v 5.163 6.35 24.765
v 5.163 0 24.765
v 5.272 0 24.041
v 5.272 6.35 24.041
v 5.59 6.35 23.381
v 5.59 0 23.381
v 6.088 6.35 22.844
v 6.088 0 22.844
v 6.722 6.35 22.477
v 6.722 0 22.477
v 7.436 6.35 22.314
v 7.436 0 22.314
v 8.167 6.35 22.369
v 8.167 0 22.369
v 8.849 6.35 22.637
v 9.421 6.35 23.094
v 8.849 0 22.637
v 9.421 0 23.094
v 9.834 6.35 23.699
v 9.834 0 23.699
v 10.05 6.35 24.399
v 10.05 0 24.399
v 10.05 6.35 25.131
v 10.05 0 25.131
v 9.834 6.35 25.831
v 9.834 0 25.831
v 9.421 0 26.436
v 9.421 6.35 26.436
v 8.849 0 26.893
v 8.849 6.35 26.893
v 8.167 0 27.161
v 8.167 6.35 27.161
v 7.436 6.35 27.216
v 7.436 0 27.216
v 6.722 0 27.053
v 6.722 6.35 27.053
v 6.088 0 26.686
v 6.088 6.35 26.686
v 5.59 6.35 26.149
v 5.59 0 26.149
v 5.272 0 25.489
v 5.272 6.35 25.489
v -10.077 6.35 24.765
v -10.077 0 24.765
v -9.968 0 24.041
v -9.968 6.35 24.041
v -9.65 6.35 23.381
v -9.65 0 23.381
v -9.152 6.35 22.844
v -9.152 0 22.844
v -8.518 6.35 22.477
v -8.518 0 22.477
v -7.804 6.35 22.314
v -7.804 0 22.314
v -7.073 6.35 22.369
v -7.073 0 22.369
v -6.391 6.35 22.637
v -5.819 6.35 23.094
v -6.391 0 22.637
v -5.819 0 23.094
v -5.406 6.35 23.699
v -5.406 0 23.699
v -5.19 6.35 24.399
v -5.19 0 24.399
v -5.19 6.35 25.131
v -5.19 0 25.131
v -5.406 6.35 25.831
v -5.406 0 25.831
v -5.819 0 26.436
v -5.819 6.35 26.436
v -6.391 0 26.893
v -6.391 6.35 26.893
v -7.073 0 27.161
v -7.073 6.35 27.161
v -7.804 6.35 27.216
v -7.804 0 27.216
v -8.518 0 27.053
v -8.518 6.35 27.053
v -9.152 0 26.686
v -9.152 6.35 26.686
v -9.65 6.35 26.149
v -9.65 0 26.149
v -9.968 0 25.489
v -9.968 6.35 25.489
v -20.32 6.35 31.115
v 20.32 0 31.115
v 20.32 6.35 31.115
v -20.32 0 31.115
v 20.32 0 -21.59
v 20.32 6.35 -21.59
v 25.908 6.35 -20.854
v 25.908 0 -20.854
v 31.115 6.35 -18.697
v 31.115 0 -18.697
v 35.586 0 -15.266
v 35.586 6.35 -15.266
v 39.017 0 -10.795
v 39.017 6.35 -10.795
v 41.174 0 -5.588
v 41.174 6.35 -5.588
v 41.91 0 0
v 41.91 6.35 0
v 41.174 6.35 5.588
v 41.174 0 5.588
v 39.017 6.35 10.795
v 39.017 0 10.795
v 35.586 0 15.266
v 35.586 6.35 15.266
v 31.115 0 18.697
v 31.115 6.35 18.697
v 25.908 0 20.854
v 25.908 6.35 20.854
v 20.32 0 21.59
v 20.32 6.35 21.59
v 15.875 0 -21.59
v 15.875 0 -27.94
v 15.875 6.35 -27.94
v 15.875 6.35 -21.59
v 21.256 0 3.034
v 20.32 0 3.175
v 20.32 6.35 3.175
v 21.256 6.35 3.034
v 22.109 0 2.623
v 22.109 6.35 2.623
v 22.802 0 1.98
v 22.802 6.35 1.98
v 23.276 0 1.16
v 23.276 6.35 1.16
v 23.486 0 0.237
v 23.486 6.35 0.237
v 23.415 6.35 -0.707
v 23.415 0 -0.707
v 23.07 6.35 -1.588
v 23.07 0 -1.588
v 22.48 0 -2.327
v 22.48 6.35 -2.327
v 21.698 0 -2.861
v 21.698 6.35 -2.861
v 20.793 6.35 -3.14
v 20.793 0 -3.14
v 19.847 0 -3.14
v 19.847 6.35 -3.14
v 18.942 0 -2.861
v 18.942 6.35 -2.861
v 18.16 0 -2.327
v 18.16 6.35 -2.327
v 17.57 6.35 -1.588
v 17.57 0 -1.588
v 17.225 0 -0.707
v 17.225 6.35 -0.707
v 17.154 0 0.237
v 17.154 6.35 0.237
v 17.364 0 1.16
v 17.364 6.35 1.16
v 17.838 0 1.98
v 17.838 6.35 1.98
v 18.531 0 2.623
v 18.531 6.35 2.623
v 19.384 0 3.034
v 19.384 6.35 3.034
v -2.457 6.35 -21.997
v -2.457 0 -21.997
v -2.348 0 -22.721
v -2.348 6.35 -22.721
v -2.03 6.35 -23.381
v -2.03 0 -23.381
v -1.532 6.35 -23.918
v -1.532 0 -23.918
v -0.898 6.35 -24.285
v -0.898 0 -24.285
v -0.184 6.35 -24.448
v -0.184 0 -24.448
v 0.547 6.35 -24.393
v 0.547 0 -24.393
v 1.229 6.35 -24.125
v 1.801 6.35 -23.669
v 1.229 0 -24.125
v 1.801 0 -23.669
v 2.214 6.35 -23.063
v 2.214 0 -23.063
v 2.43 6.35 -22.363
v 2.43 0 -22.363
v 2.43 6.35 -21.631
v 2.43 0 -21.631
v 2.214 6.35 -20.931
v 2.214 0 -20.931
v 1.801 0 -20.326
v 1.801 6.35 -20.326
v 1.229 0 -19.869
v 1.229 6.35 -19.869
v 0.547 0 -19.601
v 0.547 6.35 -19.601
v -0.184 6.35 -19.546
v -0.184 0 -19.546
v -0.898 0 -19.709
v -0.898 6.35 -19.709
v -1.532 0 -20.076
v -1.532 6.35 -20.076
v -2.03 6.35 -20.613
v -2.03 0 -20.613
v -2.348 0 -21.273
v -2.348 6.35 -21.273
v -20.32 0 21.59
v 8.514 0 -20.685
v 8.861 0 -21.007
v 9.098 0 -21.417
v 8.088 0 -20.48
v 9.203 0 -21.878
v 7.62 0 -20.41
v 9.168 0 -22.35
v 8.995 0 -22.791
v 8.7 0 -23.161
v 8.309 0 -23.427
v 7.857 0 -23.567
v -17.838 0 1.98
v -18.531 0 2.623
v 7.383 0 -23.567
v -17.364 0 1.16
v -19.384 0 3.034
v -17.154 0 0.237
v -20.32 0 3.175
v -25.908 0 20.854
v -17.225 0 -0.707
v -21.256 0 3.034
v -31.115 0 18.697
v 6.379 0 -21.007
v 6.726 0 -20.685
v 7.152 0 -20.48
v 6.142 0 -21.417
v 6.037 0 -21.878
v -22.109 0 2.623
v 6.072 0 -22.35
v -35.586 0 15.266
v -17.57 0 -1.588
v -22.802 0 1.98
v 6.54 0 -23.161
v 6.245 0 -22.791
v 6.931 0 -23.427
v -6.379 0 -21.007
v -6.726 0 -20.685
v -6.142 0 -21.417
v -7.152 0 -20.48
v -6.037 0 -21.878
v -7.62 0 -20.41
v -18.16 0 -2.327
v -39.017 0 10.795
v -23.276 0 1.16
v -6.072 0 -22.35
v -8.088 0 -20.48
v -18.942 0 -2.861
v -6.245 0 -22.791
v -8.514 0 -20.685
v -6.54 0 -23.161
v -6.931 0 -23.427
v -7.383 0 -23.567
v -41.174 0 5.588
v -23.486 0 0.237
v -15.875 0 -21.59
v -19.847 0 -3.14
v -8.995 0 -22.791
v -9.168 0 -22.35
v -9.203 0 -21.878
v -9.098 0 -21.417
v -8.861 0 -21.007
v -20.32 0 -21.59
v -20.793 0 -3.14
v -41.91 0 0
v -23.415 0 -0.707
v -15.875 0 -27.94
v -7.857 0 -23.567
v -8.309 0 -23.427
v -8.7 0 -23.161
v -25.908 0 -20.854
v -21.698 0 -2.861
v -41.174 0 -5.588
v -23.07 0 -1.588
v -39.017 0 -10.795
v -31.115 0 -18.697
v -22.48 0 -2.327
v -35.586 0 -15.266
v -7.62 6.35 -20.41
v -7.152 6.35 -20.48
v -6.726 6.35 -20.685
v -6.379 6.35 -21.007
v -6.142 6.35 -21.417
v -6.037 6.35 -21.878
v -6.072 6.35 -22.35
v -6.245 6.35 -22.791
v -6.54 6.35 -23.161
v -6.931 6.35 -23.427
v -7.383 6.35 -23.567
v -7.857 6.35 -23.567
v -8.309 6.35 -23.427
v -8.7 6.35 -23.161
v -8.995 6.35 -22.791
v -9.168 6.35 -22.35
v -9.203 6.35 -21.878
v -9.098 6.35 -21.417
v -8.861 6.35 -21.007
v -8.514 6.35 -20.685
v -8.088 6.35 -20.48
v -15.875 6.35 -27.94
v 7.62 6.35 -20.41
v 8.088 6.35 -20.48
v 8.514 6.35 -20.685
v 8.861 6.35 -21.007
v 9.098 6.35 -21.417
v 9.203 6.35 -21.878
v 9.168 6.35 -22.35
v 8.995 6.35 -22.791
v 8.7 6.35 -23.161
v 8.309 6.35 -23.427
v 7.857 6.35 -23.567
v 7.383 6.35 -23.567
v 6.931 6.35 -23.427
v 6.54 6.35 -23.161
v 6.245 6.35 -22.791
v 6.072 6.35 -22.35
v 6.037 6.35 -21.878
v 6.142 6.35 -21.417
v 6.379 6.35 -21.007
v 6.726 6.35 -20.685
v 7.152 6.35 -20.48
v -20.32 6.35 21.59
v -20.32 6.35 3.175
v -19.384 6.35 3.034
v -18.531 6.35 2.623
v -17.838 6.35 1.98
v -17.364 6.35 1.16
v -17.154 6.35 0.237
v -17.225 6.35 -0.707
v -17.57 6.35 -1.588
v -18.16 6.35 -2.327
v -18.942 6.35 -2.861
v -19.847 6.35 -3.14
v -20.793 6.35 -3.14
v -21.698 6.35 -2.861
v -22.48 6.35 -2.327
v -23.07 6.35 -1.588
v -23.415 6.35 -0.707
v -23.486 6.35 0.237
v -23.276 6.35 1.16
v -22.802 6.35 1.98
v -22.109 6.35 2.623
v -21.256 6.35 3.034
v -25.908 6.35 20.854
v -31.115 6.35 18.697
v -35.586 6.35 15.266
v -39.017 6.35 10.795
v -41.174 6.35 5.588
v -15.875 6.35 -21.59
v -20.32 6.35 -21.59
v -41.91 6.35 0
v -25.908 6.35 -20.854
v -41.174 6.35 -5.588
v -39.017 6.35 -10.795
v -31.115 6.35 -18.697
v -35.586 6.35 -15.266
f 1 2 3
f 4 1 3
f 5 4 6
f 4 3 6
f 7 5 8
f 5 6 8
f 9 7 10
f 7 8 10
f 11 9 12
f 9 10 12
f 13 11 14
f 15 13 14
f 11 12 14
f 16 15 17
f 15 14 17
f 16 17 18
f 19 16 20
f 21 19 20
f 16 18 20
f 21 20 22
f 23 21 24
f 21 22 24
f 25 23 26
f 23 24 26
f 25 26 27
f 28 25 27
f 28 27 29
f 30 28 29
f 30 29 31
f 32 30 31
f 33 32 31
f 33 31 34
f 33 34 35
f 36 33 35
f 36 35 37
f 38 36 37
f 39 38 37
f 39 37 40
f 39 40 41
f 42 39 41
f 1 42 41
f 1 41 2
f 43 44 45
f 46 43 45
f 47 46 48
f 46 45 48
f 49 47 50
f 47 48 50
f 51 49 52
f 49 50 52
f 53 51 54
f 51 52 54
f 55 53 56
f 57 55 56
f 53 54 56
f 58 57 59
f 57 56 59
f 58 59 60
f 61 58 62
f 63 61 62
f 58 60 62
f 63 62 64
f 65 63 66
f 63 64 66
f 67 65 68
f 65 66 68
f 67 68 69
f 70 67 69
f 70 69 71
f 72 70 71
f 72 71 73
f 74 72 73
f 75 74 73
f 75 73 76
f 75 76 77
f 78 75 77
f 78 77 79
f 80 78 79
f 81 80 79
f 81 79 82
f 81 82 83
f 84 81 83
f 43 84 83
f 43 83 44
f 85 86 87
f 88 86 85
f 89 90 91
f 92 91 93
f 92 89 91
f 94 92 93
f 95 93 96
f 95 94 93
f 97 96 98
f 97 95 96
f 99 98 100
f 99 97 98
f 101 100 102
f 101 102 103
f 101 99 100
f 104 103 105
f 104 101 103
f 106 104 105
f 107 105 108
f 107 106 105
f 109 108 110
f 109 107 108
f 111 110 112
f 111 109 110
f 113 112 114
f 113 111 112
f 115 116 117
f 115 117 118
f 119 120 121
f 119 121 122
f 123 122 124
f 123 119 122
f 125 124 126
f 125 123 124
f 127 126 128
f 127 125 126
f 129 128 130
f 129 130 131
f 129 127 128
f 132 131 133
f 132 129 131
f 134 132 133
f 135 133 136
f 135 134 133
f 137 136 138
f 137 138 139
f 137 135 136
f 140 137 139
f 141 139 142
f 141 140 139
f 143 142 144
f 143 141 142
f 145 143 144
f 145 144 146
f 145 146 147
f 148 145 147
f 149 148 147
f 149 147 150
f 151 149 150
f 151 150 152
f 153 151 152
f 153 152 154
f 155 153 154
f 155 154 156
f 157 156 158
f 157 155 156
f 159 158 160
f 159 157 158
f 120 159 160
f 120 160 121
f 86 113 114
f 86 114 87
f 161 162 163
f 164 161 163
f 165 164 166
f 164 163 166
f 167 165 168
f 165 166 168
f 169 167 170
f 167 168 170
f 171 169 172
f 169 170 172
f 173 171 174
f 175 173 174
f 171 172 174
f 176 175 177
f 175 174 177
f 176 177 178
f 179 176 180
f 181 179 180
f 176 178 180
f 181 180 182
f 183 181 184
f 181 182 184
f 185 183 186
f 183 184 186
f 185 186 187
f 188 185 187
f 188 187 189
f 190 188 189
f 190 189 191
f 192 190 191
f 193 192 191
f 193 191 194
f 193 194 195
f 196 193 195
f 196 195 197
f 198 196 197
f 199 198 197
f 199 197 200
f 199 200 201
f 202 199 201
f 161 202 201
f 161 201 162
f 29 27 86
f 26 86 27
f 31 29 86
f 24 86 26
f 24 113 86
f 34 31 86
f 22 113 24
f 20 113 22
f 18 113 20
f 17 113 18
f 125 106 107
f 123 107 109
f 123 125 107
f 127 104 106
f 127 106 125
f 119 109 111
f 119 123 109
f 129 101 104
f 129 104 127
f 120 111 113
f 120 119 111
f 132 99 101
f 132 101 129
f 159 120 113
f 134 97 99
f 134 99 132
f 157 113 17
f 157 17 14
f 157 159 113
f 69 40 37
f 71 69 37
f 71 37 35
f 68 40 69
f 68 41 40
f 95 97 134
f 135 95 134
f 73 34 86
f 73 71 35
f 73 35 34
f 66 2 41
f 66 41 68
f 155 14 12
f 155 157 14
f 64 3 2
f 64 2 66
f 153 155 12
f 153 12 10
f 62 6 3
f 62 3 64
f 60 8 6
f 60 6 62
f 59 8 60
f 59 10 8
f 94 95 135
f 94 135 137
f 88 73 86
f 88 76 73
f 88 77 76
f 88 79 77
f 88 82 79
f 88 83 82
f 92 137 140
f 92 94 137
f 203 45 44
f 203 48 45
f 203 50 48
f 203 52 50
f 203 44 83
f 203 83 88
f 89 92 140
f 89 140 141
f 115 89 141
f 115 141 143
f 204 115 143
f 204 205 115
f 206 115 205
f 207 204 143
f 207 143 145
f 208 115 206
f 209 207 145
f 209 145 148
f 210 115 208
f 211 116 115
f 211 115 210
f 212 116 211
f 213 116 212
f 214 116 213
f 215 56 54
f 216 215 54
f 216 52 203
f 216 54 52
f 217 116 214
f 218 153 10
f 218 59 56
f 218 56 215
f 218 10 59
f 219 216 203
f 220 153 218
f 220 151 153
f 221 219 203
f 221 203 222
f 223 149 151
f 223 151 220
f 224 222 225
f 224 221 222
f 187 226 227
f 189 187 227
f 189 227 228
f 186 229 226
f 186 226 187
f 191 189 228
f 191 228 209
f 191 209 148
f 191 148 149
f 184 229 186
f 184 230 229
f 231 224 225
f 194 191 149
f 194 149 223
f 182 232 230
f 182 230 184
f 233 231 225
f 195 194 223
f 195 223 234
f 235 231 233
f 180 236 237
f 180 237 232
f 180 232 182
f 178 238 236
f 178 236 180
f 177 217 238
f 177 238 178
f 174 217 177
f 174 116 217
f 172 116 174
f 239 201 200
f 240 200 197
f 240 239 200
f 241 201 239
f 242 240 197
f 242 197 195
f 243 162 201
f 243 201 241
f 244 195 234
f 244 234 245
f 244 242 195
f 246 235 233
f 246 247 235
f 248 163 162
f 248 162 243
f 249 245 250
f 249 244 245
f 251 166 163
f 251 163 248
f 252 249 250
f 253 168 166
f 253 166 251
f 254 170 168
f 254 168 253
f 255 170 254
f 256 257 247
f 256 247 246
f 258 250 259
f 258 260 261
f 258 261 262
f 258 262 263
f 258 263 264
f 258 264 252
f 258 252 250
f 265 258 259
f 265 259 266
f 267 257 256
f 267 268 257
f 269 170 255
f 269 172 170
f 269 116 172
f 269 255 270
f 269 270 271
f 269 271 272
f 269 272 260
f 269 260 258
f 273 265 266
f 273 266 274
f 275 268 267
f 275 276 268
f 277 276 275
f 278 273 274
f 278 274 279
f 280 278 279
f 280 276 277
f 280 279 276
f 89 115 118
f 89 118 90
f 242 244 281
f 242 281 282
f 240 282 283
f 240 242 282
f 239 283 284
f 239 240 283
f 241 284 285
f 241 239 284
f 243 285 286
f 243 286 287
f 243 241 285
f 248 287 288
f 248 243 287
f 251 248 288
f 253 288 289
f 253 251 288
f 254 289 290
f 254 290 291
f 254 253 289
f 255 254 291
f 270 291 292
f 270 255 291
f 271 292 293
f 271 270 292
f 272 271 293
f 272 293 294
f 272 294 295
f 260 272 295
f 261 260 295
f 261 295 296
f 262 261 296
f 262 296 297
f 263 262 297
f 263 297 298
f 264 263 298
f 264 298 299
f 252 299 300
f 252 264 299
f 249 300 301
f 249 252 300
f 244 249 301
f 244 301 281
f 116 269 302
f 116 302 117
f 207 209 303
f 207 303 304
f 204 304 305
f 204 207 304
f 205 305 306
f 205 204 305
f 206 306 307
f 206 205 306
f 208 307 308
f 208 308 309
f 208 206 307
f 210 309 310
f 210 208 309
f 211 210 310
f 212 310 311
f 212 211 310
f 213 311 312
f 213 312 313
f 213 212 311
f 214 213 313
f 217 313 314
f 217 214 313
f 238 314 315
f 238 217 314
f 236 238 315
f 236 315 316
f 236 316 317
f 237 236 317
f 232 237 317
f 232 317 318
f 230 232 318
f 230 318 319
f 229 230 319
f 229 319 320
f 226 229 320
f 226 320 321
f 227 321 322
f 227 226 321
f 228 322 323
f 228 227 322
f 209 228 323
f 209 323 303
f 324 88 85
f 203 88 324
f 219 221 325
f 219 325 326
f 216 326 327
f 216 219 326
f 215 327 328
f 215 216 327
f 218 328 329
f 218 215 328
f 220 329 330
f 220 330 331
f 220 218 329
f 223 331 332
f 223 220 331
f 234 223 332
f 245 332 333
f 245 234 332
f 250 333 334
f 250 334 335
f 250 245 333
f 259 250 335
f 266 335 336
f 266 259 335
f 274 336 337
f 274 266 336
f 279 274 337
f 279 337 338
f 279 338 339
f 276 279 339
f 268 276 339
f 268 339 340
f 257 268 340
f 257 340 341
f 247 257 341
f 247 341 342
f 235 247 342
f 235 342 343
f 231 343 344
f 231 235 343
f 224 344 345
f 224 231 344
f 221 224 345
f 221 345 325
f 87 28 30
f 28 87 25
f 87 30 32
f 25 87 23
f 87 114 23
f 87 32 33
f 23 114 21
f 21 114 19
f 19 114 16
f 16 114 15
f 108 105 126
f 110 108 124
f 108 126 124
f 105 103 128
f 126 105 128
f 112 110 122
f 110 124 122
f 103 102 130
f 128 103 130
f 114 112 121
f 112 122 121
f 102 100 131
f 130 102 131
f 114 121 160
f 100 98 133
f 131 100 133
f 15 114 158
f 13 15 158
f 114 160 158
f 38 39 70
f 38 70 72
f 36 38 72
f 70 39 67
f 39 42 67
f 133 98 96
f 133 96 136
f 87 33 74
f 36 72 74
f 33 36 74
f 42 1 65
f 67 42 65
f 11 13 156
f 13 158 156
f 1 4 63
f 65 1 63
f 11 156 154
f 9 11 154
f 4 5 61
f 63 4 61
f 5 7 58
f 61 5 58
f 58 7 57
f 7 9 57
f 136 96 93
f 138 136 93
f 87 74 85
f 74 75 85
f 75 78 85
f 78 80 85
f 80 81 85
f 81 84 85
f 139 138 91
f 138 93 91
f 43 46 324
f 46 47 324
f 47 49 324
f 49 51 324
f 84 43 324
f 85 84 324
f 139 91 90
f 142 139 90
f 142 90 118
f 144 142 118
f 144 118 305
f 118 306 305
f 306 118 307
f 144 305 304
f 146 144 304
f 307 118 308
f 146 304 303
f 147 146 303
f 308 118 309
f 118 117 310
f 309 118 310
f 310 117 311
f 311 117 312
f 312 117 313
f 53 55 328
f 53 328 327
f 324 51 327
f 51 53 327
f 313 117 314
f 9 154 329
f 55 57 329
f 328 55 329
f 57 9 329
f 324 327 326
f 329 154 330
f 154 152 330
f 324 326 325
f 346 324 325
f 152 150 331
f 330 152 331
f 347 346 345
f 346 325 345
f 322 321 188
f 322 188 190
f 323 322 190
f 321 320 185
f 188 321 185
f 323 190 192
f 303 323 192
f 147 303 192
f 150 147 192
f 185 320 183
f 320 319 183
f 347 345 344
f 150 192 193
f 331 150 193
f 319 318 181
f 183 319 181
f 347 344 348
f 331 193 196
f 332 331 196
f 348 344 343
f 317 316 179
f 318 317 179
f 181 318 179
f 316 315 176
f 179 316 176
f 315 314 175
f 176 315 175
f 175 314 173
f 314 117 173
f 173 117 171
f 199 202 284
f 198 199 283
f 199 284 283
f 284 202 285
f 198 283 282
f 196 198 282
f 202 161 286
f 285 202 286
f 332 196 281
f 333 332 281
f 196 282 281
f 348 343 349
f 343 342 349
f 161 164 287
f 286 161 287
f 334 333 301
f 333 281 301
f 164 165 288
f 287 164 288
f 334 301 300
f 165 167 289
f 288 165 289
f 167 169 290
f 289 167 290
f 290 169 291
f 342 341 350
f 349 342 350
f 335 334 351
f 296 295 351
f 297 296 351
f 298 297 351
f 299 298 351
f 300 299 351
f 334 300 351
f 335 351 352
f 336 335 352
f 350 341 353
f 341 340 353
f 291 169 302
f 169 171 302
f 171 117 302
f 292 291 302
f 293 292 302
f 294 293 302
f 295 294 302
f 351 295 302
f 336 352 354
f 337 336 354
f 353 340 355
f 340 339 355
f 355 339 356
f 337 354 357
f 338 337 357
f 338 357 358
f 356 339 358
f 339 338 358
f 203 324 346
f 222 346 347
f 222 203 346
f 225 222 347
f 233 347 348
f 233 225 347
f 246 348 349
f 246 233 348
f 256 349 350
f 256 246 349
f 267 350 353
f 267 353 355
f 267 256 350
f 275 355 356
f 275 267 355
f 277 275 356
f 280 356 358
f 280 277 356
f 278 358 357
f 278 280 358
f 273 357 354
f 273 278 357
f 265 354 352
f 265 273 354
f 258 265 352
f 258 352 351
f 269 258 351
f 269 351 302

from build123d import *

# Parameters (mm, degrees)
SKETCH1_R                    = 3.175
SKETCH1_R_2                  = 1.5875
BOSS_EXTRUDE1_DEPTH          = 6.35
F_10_0_1935_DIAMETER_HOLE1_D = 4.9149


with BuildPart() as part:
    # Sketch1 → Boss-Extrude1 (new body)
    with BuildSketch(Plane(origin=(0, 0, 0), x_dir=(1, 0, 0), z_dir=(0, 1, 0))):
        with BuildLine():
            Line((-20.32, 21.59), (-15.875, 21.59))
            Line((-15.875, 21.59), (-15.875, 27.94))
            Line((-15.875, 27.94), (15.875, 27.94))
            Line((15.875, 27.94), (15.875, 21.59))
            Line((15.875, 21.59), (20.32, 21.59))
            ThreePointArc((20.32, 21.59), (41.91, 0), (20.32, -21.59))
            Line((20.32, -21.59), (20.32, -31.115))
            Line((20.32, -31.115), (-20.32, -31.115))
            Line((-20.32, -31.115), (-20.32, -21.59))
            ThreePointArc((-20.32, -21.59), (-41.91, 0), (-20.32, 21.59))
        make_face()
        with Locations(Location((20.32, 0, 0), (0, 0, 270))):
            Circle(SKETCH1_R, mode=Mode.SUBTRACT)
        with Locations(Location((7.62, 21.997045256, 0), (0, 0, 270))):
            Circle(SKETCH1_R_2, mode=Mode.SUBTRACT)
        with Locations(Location((-20.32, 0, 0), (0, 0, 270))):
            Circle(SKETCH1_R, mode=Mode.SUBTRACT)
        with Locations(Location((-7.62, 21.997045256, 0), (0, 0, 270))):
            Circle(SKETCH1_R_2, mode=Mode.SUBTRACT)
    extrude(amount=BOSS_EXTRUDE1_DEPTH)

    # #10 (0.1935) Diameter Hole1 (through all)
    with Locations(Plane(origin=(0, 6.35, 0), x_dir=(1, 0, 0), z_dir=(0, 1, 0))):
        with Locations((0, 21.997045256), (-7.62, -24.765), (7.62, -24.765)):
            Hole(F_10_0_1935_DIAMETER_HOLE1_D / 2)


solid = part.part
